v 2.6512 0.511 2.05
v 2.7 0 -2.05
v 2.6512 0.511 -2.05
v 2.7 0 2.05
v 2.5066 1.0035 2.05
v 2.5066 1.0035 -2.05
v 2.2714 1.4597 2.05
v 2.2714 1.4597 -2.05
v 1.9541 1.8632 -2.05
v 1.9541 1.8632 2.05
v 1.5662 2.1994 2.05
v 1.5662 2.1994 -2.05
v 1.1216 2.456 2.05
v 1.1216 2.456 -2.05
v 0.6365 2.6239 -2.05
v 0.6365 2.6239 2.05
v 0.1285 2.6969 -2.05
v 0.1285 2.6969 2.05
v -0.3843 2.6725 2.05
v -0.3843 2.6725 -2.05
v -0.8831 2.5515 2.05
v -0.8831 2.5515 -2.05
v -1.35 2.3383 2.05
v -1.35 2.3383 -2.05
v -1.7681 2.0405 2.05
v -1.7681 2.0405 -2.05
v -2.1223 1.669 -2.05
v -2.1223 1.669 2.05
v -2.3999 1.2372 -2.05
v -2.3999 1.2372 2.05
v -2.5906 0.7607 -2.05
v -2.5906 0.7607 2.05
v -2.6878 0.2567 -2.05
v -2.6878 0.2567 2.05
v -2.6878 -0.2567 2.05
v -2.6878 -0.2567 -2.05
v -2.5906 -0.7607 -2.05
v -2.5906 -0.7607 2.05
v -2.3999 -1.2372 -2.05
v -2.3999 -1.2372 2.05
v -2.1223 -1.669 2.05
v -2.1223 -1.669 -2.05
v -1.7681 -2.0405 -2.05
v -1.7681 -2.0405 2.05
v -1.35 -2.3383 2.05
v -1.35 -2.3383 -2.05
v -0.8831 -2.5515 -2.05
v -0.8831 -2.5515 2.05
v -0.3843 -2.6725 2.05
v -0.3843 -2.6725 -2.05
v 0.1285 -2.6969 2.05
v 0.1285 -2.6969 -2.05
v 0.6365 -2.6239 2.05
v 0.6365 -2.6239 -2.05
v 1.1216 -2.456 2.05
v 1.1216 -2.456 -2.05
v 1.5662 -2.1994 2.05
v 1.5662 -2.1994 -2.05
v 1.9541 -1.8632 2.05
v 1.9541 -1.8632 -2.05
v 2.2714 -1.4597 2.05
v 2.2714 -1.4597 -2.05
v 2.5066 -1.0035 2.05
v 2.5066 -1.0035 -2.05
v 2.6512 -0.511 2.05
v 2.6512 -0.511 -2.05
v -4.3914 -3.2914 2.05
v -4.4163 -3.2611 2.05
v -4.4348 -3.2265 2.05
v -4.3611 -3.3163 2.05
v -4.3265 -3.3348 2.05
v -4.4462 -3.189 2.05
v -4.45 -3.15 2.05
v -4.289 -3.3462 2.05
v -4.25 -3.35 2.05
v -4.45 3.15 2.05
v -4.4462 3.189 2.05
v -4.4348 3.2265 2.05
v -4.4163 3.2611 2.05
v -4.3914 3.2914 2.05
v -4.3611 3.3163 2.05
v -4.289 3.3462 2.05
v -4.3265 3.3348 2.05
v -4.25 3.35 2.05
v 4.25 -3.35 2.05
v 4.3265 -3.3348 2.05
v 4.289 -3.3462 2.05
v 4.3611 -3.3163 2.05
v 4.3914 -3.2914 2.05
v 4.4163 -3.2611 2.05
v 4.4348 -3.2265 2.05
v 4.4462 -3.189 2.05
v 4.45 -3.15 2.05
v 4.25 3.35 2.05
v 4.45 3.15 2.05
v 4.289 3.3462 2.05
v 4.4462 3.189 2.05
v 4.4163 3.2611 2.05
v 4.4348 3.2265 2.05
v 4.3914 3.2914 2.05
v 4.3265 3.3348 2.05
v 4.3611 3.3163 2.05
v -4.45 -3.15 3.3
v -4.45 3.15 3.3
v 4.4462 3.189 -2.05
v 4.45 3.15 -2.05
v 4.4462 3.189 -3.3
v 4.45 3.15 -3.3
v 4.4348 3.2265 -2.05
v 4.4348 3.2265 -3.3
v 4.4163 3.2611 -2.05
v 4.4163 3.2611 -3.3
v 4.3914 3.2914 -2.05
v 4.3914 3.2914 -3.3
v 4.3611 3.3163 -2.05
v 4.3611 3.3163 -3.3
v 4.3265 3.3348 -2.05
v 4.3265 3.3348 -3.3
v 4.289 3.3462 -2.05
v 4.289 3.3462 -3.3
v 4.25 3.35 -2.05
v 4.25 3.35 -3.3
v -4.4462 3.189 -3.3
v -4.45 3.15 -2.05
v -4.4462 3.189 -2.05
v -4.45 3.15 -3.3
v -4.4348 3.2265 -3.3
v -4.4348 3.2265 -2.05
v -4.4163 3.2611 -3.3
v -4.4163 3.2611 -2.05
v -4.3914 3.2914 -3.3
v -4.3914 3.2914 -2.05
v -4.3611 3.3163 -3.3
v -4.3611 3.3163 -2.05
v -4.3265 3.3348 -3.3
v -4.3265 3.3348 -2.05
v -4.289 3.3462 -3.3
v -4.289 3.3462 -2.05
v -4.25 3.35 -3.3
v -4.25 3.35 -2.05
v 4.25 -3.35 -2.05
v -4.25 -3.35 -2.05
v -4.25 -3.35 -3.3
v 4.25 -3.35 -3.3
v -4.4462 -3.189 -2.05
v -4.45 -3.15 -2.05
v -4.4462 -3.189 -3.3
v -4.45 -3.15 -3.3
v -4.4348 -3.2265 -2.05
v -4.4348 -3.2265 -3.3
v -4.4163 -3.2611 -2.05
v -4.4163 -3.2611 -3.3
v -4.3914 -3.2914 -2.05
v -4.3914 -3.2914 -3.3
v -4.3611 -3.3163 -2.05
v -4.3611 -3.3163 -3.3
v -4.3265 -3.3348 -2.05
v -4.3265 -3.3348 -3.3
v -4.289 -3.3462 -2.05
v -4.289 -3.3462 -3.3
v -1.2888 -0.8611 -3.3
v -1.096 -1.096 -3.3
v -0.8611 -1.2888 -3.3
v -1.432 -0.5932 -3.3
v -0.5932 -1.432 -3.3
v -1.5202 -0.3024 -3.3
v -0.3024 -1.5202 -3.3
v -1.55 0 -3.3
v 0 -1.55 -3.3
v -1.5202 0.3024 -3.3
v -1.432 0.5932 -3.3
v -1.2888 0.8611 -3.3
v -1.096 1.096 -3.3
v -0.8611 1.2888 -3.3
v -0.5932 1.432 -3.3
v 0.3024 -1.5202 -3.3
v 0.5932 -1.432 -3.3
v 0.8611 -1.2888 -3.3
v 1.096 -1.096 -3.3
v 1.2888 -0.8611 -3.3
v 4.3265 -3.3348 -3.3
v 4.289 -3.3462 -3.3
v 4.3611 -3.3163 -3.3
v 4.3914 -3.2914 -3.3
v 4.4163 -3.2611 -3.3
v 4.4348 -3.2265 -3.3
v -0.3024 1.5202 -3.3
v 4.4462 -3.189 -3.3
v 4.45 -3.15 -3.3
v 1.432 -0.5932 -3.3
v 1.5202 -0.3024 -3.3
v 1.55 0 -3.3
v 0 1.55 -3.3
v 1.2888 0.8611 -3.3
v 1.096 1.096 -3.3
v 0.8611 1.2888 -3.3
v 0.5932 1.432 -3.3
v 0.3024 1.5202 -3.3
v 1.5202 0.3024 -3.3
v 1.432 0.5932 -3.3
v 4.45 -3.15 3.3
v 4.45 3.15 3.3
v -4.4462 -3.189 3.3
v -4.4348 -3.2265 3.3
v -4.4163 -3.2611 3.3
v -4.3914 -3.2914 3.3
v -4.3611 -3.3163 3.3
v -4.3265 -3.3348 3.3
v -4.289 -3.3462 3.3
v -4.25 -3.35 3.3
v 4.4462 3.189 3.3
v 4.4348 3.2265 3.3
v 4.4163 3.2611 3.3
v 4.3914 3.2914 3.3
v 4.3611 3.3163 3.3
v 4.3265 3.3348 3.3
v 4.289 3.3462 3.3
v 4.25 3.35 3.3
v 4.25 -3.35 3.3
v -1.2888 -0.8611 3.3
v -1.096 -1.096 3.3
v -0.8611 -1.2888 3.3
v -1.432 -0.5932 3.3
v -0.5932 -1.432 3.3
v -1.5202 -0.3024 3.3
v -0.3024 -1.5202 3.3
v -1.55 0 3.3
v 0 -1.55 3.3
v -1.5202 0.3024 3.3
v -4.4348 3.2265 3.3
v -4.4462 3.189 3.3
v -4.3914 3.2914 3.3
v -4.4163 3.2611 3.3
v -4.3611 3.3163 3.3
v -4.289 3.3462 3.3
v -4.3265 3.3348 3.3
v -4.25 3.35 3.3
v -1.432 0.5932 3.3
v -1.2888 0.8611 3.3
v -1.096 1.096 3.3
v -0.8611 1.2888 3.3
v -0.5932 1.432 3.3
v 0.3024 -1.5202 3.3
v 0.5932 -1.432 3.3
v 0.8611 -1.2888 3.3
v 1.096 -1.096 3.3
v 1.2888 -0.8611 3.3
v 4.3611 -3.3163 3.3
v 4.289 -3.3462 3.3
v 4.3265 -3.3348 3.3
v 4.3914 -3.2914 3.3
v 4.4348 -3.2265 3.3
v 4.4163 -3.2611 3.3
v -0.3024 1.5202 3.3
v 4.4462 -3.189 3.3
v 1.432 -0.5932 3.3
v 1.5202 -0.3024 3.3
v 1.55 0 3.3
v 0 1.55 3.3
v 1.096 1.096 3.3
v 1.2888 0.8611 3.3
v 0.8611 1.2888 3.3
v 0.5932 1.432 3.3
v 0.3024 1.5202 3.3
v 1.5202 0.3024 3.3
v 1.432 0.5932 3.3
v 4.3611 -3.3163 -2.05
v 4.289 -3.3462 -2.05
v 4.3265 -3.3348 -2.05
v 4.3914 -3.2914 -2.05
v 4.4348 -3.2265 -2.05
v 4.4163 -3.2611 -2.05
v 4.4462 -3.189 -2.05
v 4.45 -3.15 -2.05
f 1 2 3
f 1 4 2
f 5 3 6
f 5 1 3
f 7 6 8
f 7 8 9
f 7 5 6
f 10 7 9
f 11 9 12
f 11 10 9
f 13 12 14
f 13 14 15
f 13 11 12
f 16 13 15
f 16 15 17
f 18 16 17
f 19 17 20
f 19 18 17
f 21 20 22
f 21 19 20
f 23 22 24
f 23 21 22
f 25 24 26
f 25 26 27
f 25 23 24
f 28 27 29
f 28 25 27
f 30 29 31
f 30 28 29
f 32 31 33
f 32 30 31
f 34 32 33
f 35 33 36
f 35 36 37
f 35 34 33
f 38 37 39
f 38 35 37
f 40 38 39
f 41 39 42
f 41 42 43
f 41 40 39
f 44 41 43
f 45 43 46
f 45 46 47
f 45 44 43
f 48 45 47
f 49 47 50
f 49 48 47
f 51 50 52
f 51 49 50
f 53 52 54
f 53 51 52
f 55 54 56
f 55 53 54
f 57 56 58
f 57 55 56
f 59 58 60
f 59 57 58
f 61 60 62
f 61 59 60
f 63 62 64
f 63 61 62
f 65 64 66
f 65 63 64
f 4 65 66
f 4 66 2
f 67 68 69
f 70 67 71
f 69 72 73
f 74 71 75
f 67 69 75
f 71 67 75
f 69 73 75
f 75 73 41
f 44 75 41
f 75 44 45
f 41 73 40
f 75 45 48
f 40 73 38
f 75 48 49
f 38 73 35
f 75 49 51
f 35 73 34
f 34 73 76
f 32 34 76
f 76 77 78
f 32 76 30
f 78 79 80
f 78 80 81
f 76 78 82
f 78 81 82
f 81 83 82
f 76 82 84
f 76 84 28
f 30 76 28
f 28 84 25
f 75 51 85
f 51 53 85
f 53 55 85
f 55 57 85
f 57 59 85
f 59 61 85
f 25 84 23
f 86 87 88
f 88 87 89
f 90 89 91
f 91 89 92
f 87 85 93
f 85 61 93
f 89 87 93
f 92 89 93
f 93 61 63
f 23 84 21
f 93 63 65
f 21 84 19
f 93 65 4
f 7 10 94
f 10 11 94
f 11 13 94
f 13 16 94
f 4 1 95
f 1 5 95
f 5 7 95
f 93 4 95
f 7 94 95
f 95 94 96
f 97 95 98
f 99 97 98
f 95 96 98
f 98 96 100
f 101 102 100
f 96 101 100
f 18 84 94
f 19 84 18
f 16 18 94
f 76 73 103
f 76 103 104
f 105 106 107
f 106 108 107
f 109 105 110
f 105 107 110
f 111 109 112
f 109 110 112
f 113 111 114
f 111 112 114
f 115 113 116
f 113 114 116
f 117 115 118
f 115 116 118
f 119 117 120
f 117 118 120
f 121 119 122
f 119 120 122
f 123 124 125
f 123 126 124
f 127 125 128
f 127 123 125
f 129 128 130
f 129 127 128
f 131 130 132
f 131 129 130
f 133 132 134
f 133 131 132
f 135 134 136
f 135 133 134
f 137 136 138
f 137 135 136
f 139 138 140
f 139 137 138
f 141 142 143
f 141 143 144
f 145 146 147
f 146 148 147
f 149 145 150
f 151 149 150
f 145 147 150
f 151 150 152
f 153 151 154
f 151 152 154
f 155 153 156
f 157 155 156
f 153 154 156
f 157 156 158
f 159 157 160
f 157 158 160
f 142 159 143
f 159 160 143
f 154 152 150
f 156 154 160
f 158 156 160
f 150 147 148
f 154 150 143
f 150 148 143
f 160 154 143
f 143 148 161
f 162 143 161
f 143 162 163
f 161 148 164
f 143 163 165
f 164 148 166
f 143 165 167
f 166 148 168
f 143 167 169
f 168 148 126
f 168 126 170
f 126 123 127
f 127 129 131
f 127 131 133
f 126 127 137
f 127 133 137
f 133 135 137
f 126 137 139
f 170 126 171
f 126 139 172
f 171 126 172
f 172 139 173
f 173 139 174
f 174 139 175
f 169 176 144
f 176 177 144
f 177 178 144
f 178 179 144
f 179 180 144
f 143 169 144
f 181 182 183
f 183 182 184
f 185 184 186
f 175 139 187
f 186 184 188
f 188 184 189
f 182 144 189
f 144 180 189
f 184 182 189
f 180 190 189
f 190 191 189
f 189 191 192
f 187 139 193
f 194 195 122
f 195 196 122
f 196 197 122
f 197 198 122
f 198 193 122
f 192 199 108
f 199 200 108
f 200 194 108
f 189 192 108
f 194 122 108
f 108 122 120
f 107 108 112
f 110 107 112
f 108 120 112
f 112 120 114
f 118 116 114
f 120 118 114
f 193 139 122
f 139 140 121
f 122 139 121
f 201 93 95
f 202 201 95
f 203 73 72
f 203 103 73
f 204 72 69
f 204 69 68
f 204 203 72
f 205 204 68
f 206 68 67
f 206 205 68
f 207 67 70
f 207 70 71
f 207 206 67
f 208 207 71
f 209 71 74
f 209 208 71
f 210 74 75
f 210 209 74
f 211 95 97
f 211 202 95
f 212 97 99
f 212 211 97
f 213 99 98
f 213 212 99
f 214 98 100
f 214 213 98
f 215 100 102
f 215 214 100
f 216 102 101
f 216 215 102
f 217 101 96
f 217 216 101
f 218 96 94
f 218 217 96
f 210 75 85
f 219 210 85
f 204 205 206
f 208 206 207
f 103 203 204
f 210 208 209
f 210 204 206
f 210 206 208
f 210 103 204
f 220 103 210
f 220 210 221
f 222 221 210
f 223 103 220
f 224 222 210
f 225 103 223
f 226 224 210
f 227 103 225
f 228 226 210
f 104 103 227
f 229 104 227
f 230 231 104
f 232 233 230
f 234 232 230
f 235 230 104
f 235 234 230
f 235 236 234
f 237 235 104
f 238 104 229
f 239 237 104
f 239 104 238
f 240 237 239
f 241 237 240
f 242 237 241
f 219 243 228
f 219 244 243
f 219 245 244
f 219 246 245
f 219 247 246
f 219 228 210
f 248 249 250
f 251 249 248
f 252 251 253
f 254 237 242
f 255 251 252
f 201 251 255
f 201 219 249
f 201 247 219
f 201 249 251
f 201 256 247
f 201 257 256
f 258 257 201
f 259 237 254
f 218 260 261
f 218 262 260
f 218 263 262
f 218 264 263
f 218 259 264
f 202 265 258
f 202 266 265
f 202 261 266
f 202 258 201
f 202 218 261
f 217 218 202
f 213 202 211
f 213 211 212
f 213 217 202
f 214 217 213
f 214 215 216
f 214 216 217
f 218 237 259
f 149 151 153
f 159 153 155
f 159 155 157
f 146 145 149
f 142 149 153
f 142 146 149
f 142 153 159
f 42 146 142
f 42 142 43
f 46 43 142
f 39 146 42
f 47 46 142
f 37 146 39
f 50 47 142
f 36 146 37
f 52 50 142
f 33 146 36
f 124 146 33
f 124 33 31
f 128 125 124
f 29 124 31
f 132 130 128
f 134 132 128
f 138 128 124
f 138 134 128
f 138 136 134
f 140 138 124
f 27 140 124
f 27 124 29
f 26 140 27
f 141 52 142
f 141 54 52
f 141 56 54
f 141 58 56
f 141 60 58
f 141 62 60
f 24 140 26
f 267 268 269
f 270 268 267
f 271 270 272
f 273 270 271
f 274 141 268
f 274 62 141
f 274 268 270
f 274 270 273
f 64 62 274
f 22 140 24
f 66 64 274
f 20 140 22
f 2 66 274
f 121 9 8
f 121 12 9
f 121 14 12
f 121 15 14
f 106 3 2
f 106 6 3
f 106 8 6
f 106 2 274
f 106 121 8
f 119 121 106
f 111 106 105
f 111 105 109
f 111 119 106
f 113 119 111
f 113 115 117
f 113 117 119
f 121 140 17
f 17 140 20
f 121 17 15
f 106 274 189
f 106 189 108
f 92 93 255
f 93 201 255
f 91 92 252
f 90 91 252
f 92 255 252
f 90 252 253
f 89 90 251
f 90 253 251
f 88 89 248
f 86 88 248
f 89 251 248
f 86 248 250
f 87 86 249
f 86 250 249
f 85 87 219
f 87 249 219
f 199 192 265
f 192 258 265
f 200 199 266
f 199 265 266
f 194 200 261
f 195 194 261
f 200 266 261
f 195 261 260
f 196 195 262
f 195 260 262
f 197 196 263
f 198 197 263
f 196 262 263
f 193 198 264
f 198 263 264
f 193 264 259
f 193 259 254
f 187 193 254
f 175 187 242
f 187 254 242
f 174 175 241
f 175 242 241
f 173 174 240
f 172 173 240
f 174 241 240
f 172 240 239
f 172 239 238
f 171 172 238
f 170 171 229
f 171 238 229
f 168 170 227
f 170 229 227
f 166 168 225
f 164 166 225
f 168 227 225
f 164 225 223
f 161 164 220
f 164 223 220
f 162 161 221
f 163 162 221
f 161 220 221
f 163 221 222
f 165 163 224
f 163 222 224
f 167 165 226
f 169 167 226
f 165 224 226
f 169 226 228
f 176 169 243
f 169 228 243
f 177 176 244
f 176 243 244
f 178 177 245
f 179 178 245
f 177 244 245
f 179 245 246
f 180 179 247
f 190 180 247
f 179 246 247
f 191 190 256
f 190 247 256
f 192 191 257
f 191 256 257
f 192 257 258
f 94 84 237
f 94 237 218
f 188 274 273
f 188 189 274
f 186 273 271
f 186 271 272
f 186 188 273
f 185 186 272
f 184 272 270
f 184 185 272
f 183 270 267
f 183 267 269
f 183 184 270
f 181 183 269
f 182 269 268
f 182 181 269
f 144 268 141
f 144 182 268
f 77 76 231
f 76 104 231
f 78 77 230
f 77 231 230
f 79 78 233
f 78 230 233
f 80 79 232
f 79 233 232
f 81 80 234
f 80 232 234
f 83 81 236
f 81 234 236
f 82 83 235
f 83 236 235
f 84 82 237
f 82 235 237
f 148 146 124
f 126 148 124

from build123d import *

# Parameters (mm, degrees)
F0_R     = 2.7
F0_R_2   = 1.55
F1_DEPTH = 2.05
F2_W     = 8.9
F2_H     = 6.7
F2_R     = 2.7
F2_R_2   = 1.55
F3_DEPTH = 1.25
F4_R     = 0.2


with BuildPart() as f1:
    # F0 (on Top) → F1 (new body)
    with BuildSketch(Plane.XY):
        Circle(F0_R)
        Circle(F0_R_2, mode=Mode.SUBTRACT)
    extrude(amount=F1_DEPTH)

    # F2 (on face) → F3 (join)
    with BuildSketch(Plane.XY.offset(2.05)):
        Rectangle(F2_W, F2_H)
        Circle(F2_R, mode=Mode.SUBTRACT)
        Circle(F2_R)
        Circle(F2_R_2, mode=Mode.SUBTRACT)
    extrude(amount=F3_DEPTH)

    # F4
    f4_edges = [f1.edges().sort_by_distance(p)[0] for p in [
        (4.45, -3.35, 2.675),
        (-4.45, -3.35, 2.675),
        (-4.45, 3.35, 2.675),
        (4.45, 3.35, 2.675),
    ]]
    fillet(f4_edges, radius=F4_R)

    # F5: F1 across plane


with BuildPart() as f1_1:
    add(f1.part)
    add(f1.part.mirror(Plane.XY))


solid = f1_1.part
